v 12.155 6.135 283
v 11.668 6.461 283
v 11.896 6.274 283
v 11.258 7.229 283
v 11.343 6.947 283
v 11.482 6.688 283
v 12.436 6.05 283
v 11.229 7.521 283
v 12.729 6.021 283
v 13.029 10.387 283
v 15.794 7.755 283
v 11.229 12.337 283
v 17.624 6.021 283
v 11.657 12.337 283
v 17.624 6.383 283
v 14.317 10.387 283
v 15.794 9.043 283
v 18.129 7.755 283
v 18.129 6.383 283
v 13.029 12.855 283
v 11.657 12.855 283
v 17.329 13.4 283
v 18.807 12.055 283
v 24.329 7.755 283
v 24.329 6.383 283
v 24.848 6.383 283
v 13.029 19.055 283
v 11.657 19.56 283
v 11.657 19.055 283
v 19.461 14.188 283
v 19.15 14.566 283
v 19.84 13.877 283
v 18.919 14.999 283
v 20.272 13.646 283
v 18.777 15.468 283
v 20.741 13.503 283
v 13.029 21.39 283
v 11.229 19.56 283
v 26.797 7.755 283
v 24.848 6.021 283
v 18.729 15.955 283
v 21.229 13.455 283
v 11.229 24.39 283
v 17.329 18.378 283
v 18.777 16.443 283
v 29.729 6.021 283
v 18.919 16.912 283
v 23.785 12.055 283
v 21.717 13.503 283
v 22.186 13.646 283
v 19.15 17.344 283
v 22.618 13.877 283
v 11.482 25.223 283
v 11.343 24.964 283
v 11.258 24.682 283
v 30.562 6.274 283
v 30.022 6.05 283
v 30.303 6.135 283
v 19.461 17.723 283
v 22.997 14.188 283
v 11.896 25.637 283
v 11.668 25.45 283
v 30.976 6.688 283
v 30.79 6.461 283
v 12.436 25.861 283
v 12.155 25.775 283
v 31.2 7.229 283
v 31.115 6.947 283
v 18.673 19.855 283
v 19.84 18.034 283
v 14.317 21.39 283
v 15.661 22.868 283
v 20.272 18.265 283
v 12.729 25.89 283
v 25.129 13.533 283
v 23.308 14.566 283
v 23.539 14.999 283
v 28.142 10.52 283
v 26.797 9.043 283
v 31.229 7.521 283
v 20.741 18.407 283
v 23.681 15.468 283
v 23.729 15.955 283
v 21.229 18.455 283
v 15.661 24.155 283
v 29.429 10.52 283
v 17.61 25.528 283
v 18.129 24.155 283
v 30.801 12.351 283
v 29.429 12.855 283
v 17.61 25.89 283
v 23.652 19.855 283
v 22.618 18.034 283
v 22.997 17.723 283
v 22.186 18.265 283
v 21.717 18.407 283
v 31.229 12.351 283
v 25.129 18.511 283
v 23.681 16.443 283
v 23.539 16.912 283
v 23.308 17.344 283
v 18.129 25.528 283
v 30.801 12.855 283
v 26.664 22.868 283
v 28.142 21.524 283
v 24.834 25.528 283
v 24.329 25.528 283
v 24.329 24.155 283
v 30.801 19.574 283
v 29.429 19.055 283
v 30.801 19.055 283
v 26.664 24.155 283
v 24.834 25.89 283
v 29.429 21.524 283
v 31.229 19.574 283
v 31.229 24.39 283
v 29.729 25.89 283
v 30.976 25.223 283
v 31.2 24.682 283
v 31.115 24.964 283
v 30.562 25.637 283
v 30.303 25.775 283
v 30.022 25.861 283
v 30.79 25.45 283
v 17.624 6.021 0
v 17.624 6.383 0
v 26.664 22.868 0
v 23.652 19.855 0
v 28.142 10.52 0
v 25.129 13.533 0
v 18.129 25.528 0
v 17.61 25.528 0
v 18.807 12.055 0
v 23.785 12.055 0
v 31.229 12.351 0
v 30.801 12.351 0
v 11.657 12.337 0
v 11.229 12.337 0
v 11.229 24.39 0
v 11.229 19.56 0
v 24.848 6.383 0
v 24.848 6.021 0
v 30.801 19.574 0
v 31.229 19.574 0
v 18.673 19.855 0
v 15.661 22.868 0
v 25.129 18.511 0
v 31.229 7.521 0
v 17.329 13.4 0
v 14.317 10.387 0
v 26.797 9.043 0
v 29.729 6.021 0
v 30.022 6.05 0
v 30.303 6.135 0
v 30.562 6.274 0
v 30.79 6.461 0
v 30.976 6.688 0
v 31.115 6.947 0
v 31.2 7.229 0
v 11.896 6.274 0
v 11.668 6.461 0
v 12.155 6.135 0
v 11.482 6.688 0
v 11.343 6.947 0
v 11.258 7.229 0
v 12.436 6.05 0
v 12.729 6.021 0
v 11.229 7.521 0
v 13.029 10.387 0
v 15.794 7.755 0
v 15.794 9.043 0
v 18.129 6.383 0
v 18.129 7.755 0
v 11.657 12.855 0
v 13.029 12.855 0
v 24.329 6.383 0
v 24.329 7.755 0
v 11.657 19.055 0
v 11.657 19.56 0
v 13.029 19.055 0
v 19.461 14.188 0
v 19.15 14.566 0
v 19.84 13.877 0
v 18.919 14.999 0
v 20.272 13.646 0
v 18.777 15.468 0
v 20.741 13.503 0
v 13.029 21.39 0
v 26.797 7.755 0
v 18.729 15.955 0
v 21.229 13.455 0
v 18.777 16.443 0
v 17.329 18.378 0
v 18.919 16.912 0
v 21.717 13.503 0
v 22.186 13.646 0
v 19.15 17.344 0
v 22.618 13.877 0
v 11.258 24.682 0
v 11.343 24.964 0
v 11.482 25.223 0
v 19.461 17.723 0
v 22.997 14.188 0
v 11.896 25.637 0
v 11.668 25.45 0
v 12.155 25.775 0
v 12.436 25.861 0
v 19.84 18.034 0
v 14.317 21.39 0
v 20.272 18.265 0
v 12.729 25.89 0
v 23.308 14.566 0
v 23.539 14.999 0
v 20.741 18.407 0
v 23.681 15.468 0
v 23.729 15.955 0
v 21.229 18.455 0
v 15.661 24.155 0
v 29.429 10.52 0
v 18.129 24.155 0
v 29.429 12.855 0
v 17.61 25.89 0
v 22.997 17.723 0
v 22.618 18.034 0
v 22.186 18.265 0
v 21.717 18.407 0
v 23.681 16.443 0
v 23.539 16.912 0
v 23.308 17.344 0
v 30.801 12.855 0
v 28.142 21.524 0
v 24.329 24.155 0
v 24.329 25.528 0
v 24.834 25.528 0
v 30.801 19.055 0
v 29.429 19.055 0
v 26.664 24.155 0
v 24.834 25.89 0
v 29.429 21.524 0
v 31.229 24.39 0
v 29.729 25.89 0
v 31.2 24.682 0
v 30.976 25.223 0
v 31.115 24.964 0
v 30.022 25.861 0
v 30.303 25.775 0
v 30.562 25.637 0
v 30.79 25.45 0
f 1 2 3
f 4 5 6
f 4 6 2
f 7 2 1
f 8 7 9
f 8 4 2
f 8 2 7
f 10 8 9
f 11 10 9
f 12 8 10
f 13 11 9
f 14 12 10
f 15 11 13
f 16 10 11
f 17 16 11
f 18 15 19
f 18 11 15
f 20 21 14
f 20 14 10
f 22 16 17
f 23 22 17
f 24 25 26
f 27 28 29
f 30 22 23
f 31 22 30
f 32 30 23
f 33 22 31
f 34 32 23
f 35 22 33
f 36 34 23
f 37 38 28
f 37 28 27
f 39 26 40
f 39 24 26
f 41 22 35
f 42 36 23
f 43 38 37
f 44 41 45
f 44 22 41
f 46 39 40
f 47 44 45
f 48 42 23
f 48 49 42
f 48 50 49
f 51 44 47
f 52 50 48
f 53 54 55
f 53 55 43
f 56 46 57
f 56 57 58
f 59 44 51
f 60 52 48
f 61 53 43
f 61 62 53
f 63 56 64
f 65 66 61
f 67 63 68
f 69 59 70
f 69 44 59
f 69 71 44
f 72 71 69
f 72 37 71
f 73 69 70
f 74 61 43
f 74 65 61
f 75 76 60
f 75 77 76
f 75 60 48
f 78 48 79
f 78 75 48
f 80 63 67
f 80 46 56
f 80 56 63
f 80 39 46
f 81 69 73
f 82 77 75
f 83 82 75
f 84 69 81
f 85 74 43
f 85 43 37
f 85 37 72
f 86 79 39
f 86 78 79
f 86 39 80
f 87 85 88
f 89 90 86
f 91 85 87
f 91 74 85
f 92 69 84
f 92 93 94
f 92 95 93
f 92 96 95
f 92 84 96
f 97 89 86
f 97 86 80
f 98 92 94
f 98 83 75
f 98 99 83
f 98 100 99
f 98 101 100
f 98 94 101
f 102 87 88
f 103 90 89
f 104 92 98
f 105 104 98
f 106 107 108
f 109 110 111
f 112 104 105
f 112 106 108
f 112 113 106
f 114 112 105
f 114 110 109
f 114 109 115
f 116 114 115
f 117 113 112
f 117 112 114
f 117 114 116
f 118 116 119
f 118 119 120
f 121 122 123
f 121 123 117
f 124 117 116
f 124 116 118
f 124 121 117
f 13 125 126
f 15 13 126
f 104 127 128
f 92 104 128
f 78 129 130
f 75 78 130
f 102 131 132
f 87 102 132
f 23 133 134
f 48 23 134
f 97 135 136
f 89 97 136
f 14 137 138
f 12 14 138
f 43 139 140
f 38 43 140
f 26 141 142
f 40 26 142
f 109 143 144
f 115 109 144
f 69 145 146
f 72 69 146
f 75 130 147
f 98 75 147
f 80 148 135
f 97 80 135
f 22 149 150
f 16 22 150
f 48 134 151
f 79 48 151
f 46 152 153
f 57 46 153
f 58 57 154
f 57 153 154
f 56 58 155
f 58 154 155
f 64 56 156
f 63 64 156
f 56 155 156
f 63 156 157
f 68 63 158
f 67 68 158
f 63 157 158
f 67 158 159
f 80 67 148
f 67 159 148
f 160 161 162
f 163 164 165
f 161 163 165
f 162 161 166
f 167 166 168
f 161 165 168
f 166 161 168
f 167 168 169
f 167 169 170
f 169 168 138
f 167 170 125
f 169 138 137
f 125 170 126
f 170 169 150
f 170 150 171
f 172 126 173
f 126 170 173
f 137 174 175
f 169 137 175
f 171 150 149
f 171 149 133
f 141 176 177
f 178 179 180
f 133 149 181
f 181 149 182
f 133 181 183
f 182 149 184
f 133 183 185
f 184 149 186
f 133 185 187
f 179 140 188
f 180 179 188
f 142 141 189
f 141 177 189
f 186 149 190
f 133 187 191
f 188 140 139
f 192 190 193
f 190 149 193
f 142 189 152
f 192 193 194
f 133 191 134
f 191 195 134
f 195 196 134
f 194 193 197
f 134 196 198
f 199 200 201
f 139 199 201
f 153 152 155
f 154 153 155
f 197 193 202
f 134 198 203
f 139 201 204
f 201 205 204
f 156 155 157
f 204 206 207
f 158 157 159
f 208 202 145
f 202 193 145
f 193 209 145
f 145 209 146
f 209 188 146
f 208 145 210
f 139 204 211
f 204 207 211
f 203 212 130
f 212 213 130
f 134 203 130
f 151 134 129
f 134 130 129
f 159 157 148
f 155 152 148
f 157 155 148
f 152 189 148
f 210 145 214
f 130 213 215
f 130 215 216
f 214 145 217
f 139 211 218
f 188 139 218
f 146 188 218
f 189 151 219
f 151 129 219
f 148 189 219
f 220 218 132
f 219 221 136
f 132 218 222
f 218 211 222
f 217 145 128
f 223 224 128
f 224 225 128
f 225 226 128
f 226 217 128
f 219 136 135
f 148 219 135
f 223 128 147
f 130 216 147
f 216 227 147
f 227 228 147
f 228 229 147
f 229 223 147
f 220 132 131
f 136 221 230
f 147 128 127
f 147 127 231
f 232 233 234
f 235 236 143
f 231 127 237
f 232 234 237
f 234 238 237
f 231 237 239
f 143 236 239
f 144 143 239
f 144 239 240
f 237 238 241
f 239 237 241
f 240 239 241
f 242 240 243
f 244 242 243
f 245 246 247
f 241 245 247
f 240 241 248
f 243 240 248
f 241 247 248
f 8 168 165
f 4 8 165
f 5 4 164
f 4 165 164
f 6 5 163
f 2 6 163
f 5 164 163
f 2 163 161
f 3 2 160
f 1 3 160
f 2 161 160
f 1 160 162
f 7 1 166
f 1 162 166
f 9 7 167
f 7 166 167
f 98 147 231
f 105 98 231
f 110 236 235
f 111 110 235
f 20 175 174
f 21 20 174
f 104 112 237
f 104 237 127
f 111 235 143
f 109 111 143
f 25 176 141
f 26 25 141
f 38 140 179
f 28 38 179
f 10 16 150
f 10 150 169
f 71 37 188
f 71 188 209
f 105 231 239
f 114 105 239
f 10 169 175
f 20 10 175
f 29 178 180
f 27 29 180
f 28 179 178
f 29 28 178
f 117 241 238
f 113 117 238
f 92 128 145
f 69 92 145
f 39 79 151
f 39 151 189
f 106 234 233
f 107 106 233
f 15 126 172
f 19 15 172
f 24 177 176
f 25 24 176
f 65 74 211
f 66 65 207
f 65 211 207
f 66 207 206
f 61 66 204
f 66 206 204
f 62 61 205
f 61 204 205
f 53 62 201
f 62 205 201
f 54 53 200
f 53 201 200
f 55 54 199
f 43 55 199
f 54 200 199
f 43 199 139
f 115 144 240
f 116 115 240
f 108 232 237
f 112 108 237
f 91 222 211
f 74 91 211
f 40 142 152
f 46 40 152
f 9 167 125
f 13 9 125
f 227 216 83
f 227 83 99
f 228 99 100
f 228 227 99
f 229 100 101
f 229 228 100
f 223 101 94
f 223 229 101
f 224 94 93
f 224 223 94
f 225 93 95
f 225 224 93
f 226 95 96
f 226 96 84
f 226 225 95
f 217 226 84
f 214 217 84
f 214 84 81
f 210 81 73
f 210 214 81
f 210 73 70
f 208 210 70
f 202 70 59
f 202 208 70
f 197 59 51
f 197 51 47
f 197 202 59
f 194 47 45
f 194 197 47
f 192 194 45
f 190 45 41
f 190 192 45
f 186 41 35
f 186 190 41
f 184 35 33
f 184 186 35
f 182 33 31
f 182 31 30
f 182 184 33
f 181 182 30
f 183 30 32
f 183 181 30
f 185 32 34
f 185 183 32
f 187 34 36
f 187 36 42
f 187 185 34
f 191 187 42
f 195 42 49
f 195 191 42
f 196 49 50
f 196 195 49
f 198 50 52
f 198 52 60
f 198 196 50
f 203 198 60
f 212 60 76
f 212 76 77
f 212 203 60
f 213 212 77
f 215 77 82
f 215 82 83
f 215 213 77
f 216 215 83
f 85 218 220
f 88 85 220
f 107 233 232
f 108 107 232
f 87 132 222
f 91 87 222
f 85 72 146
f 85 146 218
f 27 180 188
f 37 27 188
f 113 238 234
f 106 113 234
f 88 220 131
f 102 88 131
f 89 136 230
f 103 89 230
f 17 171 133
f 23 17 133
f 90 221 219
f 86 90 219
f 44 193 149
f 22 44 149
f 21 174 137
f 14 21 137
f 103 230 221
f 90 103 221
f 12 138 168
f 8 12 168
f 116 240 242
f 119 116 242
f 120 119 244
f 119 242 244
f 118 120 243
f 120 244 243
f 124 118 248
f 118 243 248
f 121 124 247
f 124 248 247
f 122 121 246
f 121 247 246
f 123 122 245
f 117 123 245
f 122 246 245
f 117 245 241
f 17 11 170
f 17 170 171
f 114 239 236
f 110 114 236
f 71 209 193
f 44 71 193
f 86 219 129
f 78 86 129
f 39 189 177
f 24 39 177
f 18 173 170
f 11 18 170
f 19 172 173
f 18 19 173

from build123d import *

# Parameters (mm, degrees)
SKETCH1_R           = 2.5
BOSS_EXTRUDE1_DEPTH = 283


with BuildPart() as part:
    # Sketch1 → Boss-Extrude1 (new body)
    with BuildSketch(Plane.XY):
        with BuildLine():
            Line((14.316619525, 10.387216168), (13.029112559, 10.387216168))
            Line((13.029112559, 10.387216168), (13.029112559, 12.855371932))
            Line((13.029112559, 12.855371932), (11.656738465, 12.855371932))
            Line((11.656738465, 12.855371932), (11.656738465, 12.336659272))
            Line((11.656738465, 12.336659272), (11.229112559, 12.336659272))
            Line((11.229112559, 12.336659272), (11.229112559, 7.521203168))
            ThreePointArc((11.229112559, 7.521203168), (11.668452387, 6.460542996), (12.729112559, 6.021203168))
            Line((12.729112559, 6.021203168), (17.624436699, 6.021203168))
            Line((17.624436699, 6.021203168), (17.624436699, 6.382997838))
            Line((17.624436699, 6.382997838), (18.129112559, 6.382997838))
            Line((18.129112559, 6.382997838), (18.129112559, 7.755371932))
            Line((18.129112559, 7.755371932), (15.794230869, 7.755371932))
            Line((15.794230869, 7.755371932), (15.794230869, 9.042878898))
            Line((15.794230869, 9.042878898), (18.806723903, 12.055371932))
            Line((18.806723903, 12.055371932), (23.784775289, 12.055371932))
            Line((23.784775289, 12.055371932), (26.797268323, 9.042878898))
            Line((26.797268323, 9.042878898), (26.797268323, 7.755371932))
            Line((26.797268323, 7.755371932), (24.329112559, 7.755371932))
            Line((24.329112559, 7.755371932), (24.329112559, 6.382997838))
            Line((24.329112559, 6.382997838), (24.847825219, 6.382997838))
            Line((24.847825219, 6.382997838), (24.847825219, 6.021203168))
            Line((24.847825219, 6.021203168), (29.729112559, 6.021203168))
            ThreePointArc((29.729112559, 6.021203168), (30.789772731, 6.460542996), (31.229112559, 7.521203168))
            Line((31.229112559, 7.521203168), (31.229112559, 12.350696072))
            Line((31.229112559, 12.350696072), (30.801486653, 12.350696072))
            Line((30.801486653, 12.350696072), (30.801486653, 12.855371932))
            Line((30.801486653, 12.855371932), (29.429112559, 12.855371932))
            Line((29.429112559, 12.855371932), (29.429112559, 10.520490242))
            Line((29.429112559, 10.520490242), (28.141605593, 10.520490242))
            Line((28.141605593, 10.520490242), (25.129112559, 13.532983276))
            Line((25.129112559, 13.532983276), (25.129112559, 18.511034662))
            Line((25.129112559, 18.511034662), (28.141605593, 21.523527696))
            Line((28.141605593, 21.523527696), (29.429112559, 21.523527696))
            Line((29.429112559, 21.523527696), (29.429112559, 19.055371932))
            Line((29.429112559, 19.055371932), (30.801486653, 19.055371932))
            Line((30.801486653, 19.055371932), (30.801486653, 19.574084592))
            Line((30.801486653, 19.574084592), (31.229112559, 19.574084592))
            Line((31.229112559, 19.574084592), (31.229112559, 24.389540696))
            ThreePointArc((31.229112559, 24.389540696), (30.789772731, 25.450200868), (29.729112559, 25.889540696))
            Line((29.729112559, 25.889540696), (24.833788419, 25.889540696))
            Line((24.833788419, 25.889540696), (24.833788419, 25.527746026))
            Line((24.833788419, 25.527746026), (24.329112559, 25.527746026))
            Line((24.329112559, 25.527746026), (24.329112559, 24.155371932))
            Line((24.329112559, 24.155371932), (26.663994249, 24.155371932))
            Line((26.663994249, 24.155371932), (26.663994249, 22.867864966))
            Line((26.663994249, 22.867864966), (23.651501215, 19.855371932))
            Line((23.651501215, 19.855371932), (18.673449829, 19.855371932))
            Line((18.673449829, 19.855371932), (15.660956795, 22.867864966))
            Line((15.660956795, 22.867864966), (15.660956795, 24.155371932))
            Line((15.660956795, 24.155371932), (18.129112559, 24.155371932))
            Line((18.129112559, 24.155371932), (18.129112559, 25.527746026))
            Line((18.129112559, 25.527746026), (17.610399899, 25.527746026))
            Line((17.610399899, 25.527746026), (17.610399899, 25.889540696))
            Line((17.610399899, 25.889540696), (12.729112559, 25.889540696))
            ThreePointArc((12.729112559, 25.889540696), (11.668452387, 25.450200868), (11.229112559, 24.389540696))
            Line((11.229112559, 24.389540696), (11.229112559, 19.560047792))
            Line((11.229112559, 19.560047792), (11.656738465, 19.560047792))
            Line((11.656738465, 19.560047792), (11.656738465, 19.055371932))
            Line((11.656738465, 19.055371932), (13.029112559, 19.055371932))
            Line((13.029112559, 19.055371932), (13.029112559, 21.390253622))
            Line((13.029112559, 21.390253622), (14.316619525, 21.390253622))
            Line((14.316619525, 21.390253622), (17.329112559, 18.377760588))
            Line((17.329112559, 18.377760588), (17.329112559, 13.399709202))
            Line((17.329112559, 13.399709202), (14.316619525, 10.387216168))
        make_face()
        with Locations((21.229112559, 15.955371932)):
            Circle(SKETCH1_R, mode=Mode.SUBTRACT)
    extrude(amount=BOSS_EXTRUDE1_DEPTH)


solid = part.part
